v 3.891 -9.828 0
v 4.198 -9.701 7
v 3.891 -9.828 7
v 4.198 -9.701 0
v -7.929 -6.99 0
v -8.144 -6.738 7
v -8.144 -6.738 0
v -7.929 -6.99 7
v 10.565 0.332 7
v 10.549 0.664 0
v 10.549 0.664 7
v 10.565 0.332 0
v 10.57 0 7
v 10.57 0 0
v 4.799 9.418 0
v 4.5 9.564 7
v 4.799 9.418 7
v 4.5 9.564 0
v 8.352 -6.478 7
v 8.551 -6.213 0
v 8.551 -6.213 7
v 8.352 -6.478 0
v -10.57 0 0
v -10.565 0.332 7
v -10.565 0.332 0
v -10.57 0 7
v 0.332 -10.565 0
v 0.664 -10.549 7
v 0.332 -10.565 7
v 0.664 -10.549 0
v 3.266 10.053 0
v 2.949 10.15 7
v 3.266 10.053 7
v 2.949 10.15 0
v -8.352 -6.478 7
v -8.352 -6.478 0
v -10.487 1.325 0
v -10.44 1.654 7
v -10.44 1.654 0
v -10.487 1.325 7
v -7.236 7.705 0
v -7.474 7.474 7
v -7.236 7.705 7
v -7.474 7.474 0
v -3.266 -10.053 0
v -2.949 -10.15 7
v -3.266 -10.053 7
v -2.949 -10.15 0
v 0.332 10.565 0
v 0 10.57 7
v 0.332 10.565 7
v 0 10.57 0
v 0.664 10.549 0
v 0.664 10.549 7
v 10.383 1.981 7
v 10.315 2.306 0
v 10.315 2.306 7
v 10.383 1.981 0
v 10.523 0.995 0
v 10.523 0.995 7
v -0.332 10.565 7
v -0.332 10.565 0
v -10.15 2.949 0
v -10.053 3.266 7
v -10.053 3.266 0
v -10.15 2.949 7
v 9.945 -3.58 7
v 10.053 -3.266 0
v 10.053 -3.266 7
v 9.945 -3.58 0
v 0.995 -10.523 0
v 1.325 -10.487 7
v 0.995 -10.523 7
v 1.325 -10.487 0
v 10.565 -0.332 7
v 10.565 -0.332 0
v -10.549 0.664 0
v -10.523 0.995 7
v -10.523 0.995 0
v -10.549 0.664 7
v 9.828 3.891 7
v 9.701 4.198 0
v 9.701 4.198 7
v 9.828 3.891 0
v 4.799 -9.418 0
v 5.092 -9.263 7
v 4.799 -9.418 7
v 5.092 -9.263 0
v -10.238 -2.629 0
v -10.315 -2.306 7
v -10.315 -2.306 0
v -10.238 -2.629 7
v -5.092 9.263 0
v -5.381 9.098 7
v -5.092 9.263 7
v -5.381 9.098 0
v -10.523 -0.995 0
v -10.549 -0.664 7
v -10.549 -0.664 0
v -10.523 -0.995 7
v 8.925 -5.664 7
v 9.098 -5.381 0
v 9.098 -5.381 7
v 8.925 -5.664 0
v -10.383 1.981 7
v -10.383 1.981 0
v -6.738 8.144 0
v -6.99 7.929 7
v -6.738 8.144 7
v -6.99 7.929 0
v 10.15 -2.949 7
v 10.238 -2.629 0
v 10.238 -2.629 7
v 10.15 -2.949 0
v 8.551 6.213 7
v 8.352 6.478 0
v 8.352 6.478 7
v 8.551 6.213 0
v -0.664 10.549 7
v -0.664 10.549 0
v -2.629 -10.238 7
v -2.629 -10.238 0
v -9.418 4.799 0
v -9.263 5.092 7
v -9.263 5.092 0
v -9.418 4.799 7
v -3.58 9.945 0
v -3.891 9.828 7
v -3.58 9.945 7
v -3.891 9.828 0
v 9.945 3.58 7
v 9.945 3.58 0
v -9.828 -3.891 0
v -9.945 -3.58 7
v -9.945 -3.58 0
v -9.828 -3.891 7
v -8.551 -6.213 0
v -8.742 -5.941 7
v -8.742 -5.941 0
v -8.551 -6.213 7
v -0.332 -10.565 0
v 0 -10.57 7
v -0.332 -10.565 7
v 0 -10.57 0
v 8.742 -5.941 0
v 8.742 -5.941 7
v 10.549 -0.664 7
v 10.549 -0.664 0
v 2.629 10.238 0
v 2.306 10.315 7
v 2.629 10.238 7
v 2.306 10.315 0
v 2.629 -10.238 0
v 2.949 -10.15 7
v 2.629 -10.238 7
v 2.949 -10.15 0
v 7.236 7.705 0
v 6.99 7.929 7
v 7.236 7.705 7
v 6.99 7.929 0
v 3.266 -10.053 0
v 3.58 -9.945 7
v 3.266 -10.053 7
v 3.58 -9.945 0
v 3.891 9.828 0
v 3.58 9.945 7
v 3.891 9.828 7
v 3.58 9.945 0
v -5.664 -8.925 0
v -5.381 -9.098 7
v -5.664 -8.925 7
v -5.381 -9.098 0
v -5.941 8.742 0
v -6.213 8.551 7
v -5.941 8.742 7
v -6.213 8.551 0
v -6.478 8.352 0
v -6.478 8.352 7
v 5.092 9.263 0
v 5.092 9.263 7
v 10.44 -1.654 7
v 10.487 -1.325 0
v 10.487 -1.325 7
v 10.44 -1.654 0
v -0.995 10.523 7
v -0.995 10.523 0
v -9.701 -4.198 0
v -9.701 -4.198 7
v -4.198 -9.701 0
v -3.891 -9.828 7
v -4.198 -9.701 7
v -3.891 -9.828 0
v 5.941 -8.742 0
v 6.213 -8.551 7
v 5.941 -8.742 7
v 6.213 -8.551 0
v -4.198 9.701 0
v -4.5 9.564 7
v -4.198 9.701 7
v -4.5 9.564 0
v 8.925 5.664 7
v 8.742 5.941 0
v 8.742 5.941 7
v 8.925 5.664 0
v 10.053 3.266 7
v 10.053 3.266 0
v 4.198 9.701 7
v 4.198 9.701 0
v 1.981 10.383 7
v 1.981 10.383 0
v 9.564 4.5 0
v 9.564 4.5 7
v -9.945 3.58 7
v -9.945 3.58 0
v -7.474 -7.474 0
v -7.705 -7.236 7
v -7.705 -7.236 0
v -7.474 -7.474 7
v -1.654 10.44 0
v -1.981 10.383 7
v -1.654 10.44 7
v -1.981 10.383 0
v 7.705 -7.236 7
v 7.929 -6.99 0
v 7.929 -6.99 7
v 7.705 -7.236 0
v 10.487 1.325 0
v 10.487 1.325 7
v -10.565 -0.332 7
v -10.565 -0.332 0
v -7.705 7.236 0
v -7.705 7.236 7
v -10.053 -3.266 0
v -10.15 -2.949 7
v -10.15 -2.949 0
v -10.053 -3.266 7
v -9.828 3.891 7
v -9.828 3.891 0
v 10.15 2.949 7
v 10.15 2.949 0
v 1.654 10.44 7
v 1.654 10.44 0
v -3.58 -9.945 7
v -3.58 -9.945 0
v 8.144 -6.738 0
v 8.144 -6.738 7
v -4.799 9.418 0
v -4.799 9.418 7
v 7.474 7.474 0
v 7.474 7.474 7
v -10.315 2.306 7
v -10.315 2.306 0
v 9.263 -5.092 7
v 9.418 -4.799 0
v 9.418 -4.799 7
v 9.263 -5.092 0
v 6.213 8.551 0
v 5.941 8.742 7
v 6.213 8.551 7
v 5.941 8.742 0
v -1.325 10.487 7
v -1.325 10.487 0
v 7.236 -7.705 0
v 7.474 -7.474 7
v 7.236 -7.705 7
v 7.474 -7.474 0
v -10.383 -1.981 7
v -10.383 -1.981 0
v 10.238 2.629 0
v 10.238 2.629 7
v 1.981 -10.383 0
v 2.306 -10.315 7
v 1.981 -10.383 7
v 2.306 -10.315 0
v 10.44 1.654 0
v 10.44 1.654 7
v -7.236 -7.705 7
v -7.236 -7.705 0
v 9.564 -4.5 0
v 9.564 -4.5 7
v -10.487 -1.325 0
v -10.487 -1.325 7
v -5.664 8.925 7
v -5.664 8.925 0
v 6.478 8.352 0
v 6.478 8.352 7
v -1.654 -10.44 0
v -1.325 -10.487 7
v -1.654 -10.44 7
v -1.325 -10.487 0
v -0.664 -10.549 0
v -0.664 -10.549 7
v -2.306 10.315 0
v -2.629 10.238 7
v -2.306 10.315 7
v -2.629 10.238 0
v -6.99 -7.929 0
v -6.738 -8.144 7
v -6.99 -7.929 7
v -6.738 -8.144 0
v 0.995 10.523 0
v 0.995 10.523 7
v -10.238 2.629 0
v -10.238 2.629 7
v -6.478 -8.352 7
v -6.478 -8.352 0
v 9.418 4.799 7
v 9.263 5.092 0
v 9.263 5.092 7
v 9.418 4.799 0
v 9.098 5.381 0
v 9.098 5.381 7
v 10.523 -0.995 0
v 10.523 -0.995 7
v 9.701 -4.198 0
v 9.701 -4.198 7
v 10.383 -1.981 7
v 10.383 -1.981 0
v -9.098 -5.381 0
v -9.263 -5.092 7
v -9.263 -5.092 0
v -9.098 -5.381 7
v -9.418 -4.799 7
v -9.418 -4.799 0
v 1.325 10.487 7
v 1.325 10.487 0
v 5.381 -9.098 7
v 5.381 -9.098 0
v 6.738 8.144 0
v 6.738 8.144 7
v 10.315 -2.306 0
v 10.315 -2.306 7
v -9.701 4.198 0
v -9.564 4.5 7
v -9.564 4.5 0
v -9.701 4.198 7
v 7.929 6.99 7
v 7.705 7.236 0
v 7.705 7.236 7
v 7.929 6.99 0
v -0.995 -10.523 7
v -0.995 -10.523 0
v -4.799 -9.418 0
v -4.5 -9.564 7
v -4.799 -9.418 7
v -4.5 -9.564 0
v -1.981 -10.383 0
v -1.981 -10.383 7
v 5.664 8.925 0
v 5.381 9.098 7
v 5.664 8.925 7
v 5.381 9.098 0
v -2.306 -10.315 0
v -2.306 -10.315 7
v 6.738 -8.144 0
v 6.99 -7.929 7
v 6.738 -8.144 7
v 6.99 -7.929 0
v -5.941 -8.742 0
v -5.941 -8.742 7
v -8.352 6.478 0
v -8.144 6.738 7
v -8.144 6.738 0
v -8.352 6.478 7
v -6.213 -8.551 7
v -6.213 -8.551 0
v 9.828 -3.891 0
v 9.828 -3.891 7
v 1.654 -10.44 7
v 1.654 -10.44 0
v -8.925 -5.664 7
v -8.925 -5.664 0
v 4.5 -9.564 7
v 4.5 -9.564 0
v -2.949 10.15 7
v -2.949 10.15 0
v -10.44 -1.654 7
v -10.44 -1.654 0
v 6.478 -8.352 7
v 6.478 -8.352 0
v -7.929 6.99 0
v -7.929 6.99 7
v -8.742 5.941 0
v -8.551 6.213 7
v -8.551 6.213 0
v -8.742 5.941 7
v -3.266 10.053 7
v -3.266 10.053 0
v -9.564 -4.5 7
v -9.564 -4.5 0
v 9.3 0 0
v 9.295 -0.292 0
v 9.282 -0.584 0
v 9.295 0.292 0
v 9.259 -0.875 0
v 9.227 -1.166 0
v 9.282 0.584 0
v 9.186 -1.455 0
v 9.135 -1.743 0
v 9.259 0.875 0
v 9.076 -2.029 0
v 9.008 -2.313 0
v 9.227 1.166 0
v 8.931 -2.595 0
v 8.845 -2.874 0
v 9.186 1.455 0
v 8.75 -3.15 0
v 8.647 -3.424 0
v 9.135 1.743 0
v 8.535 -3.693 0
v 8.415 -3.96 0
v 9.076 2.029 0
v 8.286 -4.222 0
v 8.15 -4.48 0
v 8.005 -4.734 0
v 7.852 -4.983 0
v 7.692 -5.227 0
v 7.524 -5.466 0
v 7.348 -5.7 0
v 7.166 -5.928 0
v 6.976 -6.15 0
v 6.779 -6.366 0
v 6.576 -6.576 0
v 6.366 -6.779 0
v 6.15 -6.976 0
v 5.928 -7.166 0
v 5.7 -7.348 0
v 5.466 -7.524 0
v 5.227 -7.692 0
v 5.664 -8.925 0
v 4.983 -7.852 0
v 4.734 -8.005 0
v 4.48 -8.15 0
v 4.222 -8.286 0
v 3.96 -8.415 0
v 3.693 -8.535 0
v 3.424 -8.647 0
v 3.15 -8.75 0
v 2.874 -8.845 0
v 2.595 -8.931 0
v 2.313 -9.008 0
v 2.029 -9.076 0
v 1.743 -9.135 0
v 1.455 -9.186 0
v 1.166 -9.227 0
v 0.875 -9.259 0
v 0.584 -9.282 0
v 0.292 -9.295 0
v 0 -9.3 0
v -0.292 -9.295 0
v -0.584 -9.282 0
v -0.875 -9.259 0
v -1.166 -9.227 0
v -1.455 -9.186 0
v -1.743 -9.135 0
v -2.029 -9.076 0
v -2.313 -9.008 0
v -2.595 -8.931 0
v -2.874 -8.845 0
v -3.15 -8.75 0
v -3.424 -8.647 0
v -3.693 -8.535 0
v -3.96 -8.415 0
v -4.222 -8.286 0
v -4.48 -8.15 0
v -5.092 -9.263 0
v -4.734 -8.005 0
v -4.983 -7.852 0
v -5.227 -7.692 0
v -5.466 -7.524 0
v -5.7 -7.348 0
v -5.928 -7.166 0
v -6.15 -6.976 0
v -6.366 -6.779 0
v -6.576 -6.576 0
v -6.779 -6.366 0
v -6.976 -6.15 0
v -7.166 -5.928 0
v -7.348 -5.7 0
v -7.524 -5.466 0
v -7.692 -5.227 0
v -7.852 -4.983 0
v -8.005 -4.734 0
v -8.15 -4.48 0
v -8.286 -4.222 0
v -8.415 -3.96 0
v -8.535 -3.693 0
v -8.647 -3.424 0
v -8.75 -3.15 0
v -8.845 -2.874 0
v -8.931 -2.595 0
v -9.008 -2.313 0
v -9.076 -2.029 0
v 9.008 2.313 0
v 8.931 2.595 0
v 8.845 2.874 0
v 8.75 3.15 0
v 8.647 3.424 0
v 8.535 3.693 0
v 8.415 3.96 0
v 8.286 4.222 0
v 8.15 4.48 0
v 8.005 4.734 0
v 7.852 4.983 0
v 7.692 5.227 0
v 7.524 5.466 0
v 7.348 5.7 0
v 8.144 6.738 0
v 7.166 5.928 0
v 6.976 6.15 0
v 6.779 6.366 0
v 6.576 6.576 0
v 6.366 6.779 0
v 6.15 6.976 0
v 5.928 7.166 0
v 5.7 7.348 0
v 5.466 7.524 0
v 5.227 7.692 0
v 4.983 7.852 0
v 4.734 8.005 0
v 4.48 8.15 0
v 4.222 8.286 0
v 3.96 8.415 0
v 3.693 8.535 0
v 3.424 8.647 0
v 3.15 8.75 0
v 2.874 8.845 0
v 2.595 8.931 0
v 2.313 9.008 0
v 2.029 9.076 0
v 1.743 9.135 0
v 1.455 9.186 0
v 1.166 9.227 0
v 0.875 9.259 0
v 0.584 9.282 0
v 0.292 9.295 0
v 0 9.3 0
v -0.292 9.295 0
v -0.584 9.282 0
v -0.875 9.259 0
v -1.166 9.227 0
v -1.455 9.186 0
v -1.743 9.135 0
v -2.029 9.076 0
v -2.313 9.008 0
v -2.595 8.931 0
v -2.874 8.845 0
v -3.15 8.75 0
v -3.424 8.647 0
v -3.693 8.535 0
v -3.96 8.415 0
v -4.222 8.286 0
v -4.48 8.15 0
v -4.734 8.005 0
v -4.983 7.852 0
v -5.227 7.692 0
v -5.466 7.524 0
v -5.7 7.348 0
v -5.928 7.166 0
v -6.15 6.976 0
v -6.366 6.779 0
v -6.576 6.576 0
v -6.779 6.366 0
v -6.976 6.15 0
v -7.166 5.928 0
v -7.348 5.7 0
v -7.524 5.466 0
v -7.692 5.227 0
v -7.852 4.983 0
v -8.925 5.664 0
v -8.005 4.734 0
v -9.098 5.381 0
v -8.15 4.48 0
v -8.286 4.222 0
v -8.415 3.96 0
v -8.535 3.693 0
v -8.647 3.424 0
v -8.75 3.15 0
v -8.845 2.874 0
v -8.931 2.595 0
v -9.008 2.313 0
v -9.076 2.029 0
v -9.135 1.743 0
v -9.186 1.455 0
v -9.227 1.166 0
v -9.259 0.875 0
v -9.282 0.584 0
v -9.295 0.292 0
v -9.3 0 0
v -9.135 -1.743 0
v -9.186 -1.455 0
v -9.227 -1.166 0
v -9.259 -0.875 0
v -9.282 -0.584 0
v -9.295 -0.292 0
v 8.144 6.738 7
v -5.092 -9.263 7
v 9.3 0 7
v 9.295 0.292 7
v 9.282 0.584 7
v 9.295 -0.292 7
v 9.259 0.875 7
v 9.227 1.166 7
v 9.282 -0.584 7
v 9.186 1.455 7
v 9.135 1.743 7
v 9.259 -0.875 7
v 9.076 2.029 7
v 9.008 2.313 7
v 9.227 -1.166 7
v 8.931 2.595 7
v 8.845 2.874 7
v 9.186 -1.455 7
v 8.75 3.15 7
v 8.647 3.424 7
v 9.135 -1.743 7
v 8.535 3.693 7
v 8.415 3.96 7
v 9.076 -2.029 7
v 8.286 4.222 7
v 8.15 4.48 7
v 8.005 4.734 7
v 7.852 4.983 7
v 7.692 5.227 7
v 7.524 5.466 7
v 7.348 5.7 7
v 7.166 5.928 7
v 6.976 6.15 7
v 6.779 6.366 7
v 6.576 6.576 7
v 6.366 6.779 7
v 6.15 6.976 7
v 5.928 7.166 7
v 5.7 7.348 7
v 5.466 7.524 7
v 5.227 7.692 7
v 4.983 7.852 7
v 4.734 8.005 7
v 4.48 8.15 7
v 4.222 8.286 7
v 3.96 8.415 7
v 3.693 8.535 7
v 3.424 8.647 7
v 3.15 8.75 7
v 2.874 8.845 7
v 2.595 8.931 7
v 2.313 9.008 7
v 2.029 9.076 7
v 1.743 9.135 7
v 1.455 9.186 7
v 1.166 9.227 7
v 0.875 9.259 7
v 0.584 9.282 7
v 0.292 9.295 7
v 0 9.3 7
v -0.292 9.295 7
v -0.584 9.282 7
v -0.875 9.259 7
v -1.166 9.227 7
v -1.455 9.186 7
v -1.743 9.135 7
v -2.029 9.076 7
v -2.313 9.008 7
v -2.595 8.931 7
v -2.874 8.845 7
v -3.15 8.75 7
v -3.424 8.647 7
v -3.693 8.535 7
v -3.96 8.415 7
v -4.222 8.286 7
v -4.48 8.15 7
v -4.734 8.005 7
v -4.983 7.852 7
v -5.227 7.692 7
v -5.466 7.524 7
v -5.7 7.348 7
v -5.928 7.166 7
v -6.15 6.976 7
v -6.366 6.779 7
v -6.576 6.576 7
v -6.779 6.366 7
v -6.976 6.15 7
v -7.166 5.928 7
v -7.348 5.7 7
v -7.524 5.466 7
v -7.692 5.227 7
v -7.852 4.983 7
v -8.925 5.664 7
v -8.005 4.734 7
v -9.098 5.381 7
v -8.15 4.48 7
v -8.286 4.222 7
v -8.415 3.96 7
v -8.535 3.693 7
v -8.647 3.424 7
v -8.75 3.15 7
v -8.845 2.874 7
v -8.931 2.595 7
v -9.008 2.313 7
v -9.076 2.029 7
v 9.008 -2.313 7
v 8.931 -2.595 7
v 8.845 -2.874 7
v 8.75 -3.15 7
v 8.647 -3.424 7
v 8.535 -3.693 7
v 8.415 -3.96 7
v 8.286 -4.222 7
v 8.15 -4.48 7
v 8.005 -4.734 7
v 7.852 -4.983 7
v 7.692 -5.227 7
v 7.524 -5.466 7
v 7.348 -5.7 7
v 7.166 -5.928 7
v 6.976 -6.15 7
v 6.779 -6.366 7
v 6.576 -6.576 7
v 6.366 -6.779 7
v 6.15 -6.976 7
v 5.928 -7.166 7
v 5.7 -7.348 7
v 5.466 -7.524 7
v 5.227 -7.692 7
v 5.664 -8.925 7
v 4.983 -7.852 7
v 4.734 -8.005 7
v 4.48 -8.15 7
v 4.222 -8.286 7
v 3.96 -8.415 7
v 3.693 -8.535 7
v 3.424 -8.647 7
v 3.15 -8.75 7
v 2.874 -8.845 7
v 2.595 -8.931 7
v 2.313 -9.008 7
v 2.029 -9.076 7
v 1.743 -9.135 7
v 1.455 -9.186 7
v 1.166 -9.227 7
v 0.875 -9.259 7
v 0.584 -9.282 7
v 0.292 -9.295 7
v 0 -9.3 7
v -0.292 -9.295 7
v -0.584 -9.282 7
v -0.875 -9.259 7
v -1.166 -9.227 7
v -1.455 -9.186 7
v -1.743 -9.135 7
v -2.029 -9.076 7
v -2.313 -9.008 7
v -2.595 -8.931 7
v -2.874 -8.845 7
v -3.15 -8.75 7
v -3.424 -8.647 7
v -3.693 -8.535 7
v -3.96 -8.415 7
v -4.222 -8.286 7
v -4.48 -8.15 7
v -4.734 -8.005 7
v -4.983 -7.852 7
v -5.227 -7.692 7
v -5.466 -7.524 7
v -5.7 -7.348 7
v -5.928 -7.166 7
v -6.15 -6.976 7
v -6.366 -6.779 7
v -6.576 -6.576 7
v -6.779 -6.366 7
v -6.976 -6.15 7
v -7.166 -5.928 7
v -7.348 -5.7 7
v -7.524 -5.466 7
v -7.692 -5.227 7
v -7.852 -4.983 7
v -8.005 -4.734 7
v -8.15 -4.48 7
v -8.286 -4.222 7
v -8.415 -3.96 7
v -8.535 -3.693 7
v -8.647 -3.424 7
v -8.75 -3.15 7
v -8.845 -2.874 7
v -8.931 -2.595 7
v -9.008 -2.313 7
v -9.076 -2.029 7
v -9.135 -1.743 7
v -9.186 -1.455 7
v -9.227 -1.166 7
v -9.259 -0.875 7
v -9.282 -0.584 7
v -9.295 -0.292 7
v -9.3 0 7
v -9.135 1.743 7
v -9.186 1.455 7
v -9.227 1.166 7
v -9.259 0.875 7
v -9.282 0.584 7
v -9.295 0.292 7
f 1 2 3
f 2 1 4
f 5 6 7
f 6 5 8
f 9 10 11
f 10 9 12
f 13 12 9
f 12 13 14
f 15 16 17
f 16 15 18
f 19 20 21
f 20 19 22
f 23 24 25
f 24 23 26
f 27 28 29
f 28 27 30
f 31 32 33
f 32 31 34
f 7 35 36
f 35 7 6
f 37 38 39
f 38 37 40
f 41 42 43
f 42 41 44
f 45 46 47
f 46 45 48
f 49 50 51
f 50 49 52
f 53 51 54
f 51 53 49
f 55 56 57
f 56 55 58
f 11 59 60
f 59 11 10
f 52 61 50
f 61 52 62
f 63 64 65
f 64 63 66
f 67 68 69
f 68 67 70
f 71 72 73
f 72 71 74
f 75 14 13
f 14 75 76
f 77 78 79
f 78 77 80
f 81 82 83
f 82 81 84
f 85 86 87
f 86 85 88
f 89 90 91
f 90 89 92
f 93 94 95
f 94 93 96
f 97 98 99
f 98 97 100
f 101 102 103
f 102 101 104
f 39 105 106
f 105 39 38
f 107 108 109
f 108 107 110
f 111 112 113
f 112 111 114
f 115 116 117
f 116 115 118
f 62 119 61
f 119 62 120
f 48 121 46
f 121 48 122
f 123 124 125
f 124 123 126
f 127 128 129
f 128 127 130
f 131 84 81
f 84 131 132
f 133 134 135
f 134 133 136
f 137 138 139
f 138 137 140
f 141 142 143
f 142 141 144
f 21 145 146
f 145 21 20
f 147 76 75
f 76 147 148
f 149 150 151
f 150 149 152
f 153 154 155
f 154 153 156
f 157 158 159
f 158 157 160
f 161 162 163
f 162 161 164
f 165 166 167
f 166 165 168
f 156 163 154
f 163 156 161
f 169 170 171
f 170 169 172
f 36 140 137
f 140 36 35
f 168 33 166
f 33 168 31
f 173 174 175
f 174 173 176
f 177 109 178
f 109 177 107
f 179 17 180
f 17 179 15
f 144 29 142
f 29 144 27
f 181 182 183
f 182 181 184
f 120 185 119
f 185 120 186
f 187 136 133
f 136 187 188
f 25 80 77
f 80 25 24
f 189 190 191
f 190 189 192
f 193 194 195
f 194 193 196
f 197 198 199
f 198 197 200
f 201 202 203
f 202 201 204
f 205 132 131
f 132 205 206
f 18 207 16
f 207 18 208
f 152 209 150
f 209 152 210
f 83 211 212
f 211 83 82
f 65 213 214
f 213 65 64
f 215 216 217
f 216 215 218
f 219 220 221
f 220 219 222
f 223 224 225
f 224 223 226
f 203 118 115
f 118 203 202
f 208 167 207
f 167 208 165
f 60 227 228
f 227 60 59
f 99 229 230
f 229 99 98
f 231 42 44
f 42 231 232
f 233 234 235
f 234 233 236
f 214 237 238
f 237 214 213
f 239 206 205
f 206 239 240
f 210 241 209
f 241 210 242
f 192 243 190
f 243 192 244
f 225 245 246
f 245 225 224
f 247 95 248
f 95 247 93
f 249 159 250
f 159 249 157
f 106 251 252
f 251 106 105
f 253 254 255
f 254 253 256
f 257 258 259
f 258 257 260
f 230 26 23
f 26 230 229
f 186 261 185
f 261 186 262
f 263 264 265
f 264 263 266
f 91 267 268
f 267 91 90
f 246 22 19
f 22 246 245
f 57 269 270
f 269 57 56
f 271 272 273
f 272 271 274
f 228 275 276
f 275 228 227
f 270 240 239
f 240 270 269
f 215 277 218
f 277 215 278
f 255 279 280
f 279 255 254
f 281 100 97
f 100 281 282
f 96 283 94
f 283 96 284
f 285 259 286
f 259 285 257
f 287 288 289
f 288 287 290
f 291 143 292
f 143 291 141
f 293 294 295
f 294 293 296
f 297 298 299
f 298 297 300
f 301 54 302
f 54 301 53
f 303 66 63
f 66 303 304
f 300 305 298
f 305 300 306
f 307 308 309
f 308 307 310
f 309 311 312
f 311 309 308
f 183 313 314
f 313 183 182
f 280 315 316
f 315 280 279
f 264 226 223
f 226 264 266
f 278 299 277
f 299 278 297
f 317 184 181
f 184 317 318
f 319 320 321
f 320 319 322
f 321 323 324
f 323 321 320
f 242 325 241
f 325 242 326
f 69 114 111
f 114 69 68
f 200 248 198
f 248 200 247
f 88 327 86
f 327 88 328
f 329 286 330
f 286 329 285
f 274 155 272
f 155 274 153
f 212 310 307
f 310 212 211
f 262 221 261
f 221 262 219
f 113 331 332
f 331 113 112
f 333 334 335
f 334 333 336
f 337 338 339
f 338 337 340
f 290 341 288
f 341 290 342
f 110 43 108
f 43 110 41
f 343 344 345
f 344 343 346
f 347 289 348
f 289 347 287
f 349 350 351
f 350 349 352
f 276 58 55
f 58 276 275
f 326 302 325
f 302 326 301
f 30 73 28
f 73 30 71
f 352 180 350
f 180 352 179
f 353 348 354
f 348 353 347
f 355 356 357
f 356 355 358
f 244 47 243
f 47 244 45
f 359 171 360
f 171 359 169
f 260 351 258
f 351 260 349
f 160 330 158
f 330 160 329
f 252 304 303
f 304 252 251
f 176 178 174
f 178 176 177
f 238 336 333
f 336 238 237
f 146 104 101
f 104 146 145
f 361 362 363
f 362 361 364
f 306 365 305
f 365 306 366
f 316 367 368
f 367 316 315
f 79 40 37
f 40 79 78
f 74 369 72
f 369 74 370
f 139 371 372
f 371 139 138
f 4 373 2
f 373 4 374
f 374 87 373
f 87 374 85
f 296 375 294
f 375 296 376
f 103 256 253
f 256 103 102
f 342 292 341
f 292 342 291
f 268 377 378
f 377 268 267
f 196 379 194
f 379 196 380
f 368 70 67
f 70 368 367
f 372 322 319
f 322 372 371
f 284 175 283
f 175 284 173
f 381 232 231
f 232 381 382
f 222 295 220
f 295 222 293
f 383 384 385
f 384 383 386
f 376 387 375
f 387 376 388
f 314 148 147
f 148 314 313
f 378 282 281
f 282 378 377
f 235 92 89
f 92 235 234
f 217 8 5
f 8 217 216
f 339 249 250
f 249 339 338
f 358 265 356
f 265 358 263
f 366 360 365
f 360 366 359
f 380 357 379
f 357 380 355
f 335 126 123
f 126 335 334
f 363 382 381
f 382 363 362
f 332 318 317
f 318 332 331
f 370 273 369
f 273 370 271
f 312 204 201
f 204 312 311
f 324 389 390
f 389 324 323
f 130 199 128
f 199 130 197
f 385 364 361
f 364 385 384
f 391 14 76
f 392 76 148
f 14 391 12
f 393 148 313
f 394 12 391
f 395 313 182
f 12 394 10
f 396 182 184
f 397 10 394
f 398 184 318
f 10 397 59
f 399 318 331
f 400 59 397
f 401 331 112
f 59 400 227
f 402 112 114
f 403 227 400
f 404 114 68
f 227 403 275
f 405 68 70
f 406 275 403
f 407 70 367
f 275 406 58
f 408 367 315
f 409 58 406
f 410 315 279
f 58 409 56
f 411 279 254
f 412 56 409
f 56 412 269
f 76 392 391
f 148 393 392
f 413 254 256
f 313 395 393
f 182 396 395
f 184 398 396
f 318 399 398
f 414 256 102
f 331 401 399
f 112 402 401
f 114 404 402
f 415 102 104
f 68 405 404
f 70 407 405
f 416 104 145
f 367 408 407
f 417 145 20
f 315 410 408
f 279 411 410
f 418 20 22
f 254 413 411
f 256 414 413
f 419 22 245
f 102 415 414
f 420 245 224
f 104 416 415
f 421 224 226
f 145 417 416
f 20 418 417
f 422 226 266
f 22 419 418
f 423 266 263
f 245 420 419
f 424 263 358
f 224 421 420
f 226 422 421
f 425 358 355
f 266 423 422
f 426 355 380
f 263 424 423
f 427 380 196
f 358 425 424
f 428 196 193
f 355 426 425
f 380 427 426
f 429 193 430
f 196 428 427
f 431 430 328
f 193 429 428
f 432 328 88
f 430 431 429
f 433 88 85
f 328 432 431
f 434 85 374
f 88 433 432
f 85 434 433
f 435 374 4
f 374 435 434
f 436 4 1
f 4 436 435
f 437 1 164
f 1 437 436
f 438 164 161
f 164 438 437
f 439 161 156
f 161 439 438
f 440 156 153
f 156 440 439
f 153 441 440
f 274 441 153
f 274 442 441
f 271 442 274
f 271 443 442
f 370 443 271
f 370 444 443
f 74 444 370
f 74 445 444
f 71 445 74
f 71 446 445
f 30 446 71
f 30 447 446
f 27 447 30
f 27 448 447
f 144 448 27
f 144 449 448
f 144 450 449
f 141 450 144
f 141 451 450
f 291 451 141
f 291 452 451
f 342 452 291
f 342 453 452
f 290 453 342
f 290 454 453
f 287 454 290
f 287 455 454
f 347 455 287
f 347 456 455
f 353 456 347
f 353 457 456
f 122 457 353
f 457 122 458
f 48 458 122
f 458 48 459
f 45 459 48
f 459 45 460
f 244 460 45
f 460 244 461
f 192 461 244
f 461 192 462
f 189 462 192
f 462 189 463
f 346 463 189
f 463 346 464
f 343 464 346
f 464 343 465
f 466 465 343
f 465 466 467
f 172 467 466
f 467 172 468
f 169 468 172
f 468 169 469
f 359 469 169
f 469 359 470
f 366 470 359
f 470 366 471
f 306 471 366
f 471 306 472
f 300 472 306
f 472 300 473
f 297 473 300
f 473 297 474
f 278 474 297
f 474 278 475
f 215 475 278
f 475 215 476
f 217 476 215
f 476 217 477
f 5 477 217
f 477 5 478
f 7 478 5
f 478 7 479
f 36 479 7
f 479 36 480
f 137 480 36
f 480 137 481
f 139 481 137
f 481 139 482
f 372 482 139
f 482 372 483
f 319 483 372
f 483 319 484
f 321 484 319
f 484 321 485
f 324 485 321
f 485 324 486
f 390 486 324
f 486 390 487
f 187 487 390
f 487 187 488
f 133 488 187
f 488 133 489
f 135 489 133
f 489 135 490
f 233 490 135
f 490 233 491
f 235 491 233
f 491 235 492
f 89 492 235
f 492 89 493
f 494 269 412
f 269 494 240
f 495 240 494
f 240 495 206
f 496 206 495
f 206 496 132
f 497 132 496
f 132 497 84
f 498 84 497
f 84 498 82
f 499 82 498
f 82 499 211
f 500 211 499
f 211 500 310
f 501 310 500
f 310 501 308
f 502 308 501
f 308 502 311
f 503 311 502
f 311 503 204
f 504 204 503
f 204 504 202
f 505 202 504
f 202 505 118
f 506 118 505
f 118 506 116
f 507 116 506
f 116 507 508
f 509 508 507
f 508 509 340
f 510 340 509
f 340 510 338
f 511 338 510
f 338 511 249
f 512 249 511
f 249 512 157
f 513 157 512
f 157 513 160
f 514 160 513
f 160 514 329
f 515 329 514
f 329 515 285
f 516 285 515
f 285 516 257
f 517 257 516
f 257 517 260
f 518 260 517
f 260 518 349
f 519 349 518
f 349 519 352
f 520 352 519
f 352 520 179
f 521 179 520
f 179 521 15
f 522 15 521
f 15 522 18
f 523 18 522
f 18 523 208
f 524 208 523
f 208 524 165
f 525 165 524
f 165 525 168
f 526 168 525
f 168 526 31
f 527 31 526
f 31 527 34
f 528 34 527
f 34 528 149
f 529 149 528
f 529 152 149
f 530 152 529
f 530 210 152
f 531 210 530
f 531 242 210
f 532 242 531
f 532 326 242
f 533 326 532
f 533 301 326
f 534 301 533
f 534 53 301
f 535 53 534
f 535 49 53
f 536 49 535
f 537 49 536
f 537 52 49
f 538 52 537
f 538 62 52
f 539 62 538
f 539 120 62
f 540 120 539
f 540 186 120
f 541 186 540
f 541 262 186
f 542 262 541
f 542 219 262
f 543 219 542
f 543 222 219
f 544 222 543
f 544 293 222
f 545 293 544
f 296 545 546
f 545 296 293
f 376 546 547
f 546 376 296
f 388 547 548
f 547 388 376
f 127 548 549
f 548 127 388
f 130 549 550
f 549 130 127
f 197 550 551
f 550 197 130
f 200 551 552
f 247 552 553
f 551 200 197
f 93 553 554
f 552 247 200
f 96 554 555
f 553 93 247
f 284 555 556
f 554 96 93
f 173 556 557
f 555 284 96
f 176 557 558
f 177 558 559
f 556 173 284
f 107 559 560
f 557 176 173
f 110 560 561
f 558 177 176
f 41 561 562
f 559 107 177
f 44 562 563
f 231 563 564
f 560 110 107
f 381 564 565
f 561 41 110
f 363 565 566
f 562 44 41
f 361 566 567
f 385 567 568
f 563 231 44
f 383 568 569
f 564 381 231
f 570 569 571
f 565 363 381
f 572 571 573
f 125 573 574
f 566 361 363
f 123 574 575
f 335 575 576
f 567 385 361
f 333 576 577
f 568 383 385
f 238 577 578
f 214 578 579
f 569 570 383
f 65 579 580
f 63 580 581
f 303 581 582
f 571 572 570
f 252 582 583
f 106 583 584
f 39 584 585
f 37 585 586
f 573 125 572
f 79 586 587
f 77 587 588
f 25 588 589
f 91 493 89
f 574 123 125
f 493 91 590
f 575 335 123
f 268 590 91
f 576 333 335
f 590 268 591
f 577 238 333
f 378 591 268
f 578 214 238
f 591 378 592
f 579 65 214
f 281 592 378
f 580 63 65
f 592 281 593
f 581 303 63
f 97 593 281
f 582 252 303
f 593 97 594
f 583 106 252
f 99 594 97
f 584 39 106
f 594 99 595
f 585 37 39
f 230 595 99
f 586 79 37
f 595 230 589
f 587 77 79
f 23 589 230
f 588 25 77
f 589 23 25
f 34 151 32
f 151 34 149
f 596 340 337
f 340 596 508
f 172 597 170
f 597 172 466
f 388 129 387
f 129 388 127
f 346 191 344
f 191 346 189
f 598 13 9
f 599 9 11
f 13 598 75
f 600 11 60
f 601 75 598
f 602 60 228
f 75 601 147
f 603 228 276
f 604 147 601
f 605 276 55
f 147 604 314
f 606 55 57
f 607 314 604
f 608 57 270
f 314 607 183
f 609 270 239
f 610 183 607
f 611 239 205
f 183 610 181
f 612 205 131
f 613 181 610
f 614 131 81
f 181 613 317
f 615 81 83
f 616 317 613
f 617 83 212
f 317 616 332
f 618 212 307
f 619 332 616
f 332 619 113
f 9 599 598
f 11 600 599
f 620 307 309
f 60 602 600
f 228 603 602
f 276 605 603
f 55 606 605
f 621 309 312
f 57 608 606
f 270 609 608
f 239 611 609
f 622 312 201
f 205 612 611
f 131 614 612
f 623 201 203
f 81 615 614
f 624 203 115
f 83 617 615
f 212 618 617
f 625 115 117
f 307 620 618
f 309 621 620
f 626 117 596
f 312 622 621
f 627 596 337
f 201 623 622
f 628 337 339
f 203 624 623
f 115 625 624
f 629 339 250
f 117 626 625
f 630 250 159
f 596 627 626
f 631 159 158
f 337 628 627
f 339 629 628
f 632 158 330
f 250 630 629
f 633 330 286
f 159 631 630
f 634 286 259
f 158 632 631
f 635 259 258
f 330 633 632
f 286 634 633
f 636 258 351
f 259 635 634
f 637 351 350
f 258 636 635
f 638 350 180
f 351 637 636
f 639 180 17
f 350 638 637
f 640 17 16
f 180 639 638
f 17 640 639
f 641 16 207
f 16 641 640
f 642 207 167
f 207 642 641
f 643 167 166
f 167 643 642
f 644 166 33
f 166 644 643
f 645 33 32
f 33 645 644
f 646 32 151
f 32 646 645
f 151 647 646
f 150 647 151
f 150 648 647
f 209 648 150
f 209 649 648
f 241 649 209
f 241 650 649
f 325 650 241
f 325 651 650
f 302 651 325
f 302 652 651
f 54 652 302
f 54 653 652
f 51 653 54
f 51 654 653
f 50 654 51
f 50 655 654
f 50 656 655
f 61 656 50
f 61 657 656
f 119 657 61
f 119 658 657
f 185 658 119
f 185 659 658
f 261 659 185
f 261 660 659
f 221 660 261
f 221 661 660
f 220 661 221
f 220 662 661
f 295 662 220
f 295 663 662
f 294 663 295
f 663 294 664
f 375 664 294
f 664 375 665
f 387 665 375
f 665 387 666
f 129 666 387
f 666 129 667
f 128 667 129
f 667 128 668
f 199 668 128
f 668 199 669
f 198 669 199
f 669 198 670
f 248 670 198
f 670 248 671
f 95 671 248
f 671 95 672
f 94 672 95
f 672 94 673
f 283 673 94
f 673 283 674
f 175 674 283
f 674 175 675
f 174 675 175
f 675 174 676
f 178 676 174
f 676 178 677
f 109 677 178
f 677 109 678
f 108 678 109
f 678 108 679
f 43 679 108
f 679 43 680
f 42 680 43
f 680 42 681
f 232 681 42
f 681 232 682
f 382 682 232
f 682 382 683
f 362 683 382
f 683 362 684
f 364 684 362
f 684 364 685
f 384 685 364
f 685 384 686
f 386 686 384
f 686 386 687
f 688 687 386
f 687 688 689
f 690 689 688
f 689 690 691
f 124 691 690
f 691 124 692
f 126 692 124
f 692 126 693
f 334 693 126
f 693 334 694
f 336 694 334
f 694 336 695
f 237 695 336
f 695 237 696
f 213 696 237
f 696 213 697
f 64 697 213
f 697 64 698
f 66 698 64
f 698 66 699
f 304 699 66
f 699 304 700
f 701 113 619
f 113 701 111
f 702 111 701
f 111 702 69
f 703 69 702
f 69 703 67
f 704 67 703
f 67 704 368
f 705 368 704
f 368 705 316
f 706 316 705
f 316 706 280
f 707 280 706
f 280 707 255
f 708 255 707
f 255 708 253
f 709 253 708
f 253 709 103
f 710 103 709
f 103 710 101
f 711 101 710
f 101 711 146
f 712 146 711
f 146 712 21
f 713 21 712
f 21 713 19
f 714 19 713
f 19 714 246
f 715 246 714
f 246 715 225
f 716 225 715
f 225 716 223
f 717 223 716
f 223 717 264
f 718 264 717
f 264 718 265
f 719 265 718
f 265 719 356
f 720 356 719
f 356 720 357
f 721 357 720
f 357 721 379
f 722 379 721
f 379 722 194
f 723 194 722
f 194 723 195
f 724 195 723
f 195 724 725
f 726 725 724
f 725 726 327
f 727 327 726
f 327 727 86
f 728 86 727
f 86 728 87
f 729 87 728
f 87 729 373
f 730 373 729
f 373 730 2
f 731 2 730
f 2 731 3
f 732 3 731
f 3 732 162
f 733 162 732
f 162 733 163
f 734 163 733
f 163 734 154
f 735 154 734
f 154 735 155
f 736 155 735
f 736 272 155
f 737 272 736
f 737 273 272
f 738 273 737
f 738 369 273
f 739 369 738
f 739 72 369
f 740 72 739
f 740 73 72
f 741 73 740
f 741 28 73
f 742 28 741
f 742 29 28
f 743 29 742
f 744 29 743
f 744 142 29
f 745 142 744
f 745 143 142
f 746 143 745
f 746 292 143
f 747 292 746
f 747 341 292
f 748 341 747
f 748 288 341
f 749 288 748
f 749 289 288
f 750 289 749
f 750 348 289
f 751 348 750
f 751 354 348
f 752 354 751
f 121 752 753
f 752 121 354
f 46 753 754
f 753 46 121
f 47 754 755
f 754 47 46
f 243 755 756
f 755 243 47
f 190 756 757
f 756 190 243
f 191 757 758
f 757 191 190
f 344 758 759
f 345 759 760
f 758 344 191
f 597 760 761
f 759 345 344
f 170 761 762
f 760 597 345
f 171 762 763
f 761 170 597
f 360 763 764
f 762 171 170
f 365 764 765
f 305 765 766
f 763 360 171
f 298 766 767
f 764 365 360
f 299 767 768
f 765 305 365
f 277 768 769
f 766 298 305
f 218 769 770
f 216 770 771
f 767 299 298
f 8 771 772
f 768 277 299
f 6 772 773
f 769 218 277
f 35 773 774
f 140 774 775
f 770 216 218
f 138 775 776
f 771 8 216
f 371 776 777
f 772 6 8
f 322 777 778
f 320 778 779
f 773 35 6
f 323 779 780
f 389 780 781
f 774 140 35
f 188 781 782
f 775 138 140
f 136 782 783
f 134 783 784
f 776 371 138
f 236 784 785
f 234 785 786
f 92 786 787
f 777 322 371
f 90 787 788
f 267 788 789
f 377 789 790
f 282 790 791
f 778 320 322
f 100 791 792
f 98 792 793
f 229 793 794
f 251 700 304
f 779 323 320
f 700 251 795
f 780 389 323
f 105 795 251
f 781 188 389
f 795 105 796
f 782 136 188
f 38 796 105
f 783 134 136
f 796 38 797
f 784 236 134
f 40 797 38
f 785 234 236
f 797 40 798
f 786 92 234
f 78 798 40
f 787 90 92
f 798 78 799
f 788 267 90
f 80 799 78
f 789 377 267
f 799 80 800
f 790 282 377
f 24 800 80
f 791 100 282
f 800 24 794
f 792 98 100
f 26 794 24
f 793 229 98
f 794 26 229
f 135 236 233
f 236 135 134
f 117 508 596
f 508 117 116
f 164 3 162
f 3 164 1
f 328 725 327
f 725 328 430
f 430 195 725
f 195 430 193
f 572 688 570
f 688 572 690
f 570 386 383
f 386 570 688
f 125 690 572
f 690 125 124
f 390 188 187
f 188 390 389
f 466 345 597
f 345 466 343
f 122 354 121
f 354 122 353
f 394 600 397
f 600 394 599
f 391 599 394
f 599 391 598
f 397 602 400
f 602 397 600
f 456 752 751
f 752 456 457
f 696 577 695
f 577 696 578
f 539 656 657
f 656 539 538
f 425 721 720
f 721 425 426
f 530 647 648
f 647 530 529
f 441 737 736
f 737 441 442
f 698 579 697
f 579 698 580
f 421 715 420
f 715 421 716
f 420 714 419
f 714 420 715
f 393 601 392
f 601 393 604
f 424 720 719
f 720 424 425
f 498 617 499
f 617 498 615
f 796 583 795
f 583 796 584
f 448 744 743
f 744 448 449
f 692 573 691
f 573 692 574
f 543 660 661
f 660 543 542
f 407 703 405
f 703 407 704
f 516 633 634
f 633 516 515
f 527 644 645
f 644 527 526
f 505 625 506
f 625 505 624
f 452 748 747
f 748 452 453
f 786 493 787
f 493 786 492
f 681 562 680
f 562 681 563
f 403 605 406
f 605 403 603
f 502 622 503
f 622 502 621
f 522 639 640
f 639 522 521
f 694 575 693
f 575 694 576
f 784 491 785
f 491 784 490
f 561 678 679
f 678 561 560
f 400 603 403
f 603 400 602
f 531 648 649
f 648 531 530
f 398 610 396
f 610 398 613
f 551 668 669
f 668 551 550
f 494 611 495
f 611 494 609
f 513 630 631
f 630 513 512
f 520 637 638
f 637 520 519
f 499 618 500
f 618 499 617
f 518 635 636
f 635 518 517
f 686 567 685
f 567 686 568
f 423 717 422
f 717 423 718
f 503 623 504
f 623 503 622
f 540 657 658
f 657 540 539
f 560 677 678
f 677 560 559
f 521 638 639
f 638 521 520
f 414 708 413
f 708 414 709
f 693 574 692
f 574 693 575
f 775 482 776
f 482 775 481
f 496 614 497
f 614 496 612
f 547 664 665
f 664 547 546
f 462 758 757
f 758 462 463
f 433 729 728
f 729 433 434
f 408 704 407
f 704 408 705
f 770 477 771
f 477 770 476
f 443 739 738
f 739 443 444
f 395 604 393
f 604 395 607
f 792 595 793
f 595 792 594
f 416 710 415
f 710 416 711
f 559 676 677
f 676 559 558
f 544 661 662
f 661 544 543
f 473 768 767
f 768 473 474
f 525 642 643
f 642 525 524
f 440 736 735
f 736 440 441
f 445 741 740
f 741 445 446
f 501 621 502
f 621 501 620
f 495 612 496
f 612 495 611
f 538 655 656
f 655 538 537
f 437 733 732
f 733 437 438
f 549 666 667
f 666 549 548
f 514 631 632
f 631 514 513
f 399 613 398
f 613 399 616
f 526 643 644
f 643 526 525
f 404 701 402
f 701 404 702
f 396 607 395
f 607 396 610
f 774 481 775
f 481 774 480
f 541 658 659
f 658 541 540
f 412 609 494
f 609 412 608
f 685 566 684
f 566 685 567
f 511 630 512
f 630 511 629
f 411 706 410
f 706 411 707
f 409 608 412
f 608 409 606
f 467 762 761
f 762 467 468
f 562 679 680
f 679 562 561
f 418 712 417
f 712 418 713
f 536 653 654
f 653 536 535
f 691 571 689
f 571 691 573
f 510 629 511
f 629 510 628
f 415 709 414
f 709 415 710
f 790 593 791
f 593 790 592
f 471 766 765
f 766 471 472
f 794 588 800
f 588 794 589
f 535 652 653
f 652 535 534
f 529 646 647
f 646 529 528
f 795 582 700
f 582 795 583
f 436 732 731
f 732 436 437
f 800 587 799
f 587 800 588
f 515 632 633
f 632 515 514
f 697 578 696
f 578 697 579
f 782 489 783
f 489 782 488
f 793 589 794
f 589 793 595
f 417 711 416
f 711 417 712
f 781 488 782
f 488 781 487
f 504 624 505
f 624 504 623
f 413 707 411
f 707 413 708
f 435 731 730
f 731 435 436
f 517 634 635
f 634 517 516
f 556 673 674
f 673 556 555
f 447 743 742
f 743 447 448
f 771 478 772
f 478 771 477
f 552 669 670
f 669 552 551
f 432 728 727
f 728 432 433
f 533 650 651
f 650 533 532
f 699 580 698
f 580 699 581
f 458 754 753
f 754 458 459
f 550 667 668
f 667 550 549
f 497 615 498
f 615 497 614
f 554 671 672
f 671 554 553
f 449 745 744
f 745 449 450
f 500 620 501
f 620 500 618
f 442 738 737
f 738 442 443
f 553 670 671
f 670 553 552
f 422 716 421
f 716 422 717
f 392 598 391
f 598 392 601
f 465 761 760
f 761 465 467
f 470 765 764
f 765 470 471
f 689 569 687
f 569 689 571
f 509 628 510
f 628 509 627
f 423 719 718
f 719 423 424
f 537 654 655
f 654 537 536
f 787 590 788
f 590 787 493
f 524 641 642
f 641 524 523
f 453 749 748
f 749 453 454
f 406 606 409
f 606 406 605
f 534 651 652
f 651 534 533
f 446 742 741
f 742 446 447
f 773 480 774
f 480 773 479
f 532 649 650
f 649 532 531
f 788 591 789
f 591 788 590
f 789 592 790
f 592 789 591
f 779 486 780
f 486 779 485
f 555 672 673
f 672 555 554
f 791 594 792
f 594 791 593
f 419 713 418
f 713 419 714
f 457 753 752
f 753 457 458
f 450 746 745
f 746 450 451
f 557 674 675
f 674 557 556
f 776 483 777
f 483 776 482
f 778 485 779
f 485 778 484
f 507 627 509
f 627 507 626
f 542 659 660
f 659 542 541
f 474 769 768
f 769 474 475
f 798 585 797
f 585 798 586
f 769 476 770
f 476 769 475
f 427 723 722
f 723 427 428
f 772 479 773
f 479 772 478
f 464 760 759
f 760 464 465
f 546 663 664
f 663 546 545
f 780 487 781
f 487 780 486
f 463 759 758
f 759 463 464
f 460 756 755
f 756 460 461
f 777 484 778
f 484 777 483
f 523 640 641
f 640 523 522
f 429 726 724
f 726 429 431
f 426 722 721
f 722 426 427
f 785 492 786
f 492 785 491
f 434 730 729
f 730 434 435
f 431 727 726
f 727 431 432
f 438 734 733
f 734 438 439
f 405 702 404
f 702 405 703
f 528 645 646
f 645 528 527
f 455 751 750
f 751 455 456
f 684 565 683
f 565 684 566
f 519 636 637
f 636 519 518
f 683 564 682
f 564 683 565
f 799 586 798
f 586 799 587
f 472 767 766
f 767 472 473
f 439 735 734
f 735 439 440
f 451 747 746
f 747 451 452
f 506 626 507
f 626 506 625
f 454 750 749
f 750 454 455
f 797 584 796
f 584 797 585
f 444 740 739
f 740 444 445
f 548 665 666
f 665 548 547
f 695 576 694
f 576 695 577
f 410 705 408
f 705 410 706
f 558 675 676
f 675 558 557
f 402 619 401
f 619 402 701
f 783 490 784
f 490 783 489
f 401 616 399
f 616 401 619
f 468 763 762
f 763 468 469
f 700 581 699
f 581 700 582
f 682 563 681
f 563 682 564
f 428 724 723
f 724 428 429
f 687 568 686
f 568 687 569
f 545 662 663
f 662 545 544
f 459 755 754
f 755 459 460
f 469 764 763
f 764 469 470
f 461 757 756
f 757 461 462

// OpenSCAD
// ─────────────────────────────────────────────────────────────
// Neutrik XXR-* Color Coding Ring  (XX-series XLR)
// Straight-walled hollow cylinder.
//   Inner diameter : 18.60 mm
//   Wall thickness : 1.27 mm  ->  Outer diameter 21.14 mm
//   Width          : 7.00 mm
// ─────────────────────────────────────────────────────────────

inner_D = 18.60;
wall    = 1.27;
width   = 7.00;

outer_D = inner_D + 2*wall;   // 21.14 mm

$fn = 200;

difference() {
    cylinder(h = width, d = outer_D, center = false);
    translate([0, 0, -0.5])
        cylinder(h = width + 1, d = inner_D, center = false);
}
